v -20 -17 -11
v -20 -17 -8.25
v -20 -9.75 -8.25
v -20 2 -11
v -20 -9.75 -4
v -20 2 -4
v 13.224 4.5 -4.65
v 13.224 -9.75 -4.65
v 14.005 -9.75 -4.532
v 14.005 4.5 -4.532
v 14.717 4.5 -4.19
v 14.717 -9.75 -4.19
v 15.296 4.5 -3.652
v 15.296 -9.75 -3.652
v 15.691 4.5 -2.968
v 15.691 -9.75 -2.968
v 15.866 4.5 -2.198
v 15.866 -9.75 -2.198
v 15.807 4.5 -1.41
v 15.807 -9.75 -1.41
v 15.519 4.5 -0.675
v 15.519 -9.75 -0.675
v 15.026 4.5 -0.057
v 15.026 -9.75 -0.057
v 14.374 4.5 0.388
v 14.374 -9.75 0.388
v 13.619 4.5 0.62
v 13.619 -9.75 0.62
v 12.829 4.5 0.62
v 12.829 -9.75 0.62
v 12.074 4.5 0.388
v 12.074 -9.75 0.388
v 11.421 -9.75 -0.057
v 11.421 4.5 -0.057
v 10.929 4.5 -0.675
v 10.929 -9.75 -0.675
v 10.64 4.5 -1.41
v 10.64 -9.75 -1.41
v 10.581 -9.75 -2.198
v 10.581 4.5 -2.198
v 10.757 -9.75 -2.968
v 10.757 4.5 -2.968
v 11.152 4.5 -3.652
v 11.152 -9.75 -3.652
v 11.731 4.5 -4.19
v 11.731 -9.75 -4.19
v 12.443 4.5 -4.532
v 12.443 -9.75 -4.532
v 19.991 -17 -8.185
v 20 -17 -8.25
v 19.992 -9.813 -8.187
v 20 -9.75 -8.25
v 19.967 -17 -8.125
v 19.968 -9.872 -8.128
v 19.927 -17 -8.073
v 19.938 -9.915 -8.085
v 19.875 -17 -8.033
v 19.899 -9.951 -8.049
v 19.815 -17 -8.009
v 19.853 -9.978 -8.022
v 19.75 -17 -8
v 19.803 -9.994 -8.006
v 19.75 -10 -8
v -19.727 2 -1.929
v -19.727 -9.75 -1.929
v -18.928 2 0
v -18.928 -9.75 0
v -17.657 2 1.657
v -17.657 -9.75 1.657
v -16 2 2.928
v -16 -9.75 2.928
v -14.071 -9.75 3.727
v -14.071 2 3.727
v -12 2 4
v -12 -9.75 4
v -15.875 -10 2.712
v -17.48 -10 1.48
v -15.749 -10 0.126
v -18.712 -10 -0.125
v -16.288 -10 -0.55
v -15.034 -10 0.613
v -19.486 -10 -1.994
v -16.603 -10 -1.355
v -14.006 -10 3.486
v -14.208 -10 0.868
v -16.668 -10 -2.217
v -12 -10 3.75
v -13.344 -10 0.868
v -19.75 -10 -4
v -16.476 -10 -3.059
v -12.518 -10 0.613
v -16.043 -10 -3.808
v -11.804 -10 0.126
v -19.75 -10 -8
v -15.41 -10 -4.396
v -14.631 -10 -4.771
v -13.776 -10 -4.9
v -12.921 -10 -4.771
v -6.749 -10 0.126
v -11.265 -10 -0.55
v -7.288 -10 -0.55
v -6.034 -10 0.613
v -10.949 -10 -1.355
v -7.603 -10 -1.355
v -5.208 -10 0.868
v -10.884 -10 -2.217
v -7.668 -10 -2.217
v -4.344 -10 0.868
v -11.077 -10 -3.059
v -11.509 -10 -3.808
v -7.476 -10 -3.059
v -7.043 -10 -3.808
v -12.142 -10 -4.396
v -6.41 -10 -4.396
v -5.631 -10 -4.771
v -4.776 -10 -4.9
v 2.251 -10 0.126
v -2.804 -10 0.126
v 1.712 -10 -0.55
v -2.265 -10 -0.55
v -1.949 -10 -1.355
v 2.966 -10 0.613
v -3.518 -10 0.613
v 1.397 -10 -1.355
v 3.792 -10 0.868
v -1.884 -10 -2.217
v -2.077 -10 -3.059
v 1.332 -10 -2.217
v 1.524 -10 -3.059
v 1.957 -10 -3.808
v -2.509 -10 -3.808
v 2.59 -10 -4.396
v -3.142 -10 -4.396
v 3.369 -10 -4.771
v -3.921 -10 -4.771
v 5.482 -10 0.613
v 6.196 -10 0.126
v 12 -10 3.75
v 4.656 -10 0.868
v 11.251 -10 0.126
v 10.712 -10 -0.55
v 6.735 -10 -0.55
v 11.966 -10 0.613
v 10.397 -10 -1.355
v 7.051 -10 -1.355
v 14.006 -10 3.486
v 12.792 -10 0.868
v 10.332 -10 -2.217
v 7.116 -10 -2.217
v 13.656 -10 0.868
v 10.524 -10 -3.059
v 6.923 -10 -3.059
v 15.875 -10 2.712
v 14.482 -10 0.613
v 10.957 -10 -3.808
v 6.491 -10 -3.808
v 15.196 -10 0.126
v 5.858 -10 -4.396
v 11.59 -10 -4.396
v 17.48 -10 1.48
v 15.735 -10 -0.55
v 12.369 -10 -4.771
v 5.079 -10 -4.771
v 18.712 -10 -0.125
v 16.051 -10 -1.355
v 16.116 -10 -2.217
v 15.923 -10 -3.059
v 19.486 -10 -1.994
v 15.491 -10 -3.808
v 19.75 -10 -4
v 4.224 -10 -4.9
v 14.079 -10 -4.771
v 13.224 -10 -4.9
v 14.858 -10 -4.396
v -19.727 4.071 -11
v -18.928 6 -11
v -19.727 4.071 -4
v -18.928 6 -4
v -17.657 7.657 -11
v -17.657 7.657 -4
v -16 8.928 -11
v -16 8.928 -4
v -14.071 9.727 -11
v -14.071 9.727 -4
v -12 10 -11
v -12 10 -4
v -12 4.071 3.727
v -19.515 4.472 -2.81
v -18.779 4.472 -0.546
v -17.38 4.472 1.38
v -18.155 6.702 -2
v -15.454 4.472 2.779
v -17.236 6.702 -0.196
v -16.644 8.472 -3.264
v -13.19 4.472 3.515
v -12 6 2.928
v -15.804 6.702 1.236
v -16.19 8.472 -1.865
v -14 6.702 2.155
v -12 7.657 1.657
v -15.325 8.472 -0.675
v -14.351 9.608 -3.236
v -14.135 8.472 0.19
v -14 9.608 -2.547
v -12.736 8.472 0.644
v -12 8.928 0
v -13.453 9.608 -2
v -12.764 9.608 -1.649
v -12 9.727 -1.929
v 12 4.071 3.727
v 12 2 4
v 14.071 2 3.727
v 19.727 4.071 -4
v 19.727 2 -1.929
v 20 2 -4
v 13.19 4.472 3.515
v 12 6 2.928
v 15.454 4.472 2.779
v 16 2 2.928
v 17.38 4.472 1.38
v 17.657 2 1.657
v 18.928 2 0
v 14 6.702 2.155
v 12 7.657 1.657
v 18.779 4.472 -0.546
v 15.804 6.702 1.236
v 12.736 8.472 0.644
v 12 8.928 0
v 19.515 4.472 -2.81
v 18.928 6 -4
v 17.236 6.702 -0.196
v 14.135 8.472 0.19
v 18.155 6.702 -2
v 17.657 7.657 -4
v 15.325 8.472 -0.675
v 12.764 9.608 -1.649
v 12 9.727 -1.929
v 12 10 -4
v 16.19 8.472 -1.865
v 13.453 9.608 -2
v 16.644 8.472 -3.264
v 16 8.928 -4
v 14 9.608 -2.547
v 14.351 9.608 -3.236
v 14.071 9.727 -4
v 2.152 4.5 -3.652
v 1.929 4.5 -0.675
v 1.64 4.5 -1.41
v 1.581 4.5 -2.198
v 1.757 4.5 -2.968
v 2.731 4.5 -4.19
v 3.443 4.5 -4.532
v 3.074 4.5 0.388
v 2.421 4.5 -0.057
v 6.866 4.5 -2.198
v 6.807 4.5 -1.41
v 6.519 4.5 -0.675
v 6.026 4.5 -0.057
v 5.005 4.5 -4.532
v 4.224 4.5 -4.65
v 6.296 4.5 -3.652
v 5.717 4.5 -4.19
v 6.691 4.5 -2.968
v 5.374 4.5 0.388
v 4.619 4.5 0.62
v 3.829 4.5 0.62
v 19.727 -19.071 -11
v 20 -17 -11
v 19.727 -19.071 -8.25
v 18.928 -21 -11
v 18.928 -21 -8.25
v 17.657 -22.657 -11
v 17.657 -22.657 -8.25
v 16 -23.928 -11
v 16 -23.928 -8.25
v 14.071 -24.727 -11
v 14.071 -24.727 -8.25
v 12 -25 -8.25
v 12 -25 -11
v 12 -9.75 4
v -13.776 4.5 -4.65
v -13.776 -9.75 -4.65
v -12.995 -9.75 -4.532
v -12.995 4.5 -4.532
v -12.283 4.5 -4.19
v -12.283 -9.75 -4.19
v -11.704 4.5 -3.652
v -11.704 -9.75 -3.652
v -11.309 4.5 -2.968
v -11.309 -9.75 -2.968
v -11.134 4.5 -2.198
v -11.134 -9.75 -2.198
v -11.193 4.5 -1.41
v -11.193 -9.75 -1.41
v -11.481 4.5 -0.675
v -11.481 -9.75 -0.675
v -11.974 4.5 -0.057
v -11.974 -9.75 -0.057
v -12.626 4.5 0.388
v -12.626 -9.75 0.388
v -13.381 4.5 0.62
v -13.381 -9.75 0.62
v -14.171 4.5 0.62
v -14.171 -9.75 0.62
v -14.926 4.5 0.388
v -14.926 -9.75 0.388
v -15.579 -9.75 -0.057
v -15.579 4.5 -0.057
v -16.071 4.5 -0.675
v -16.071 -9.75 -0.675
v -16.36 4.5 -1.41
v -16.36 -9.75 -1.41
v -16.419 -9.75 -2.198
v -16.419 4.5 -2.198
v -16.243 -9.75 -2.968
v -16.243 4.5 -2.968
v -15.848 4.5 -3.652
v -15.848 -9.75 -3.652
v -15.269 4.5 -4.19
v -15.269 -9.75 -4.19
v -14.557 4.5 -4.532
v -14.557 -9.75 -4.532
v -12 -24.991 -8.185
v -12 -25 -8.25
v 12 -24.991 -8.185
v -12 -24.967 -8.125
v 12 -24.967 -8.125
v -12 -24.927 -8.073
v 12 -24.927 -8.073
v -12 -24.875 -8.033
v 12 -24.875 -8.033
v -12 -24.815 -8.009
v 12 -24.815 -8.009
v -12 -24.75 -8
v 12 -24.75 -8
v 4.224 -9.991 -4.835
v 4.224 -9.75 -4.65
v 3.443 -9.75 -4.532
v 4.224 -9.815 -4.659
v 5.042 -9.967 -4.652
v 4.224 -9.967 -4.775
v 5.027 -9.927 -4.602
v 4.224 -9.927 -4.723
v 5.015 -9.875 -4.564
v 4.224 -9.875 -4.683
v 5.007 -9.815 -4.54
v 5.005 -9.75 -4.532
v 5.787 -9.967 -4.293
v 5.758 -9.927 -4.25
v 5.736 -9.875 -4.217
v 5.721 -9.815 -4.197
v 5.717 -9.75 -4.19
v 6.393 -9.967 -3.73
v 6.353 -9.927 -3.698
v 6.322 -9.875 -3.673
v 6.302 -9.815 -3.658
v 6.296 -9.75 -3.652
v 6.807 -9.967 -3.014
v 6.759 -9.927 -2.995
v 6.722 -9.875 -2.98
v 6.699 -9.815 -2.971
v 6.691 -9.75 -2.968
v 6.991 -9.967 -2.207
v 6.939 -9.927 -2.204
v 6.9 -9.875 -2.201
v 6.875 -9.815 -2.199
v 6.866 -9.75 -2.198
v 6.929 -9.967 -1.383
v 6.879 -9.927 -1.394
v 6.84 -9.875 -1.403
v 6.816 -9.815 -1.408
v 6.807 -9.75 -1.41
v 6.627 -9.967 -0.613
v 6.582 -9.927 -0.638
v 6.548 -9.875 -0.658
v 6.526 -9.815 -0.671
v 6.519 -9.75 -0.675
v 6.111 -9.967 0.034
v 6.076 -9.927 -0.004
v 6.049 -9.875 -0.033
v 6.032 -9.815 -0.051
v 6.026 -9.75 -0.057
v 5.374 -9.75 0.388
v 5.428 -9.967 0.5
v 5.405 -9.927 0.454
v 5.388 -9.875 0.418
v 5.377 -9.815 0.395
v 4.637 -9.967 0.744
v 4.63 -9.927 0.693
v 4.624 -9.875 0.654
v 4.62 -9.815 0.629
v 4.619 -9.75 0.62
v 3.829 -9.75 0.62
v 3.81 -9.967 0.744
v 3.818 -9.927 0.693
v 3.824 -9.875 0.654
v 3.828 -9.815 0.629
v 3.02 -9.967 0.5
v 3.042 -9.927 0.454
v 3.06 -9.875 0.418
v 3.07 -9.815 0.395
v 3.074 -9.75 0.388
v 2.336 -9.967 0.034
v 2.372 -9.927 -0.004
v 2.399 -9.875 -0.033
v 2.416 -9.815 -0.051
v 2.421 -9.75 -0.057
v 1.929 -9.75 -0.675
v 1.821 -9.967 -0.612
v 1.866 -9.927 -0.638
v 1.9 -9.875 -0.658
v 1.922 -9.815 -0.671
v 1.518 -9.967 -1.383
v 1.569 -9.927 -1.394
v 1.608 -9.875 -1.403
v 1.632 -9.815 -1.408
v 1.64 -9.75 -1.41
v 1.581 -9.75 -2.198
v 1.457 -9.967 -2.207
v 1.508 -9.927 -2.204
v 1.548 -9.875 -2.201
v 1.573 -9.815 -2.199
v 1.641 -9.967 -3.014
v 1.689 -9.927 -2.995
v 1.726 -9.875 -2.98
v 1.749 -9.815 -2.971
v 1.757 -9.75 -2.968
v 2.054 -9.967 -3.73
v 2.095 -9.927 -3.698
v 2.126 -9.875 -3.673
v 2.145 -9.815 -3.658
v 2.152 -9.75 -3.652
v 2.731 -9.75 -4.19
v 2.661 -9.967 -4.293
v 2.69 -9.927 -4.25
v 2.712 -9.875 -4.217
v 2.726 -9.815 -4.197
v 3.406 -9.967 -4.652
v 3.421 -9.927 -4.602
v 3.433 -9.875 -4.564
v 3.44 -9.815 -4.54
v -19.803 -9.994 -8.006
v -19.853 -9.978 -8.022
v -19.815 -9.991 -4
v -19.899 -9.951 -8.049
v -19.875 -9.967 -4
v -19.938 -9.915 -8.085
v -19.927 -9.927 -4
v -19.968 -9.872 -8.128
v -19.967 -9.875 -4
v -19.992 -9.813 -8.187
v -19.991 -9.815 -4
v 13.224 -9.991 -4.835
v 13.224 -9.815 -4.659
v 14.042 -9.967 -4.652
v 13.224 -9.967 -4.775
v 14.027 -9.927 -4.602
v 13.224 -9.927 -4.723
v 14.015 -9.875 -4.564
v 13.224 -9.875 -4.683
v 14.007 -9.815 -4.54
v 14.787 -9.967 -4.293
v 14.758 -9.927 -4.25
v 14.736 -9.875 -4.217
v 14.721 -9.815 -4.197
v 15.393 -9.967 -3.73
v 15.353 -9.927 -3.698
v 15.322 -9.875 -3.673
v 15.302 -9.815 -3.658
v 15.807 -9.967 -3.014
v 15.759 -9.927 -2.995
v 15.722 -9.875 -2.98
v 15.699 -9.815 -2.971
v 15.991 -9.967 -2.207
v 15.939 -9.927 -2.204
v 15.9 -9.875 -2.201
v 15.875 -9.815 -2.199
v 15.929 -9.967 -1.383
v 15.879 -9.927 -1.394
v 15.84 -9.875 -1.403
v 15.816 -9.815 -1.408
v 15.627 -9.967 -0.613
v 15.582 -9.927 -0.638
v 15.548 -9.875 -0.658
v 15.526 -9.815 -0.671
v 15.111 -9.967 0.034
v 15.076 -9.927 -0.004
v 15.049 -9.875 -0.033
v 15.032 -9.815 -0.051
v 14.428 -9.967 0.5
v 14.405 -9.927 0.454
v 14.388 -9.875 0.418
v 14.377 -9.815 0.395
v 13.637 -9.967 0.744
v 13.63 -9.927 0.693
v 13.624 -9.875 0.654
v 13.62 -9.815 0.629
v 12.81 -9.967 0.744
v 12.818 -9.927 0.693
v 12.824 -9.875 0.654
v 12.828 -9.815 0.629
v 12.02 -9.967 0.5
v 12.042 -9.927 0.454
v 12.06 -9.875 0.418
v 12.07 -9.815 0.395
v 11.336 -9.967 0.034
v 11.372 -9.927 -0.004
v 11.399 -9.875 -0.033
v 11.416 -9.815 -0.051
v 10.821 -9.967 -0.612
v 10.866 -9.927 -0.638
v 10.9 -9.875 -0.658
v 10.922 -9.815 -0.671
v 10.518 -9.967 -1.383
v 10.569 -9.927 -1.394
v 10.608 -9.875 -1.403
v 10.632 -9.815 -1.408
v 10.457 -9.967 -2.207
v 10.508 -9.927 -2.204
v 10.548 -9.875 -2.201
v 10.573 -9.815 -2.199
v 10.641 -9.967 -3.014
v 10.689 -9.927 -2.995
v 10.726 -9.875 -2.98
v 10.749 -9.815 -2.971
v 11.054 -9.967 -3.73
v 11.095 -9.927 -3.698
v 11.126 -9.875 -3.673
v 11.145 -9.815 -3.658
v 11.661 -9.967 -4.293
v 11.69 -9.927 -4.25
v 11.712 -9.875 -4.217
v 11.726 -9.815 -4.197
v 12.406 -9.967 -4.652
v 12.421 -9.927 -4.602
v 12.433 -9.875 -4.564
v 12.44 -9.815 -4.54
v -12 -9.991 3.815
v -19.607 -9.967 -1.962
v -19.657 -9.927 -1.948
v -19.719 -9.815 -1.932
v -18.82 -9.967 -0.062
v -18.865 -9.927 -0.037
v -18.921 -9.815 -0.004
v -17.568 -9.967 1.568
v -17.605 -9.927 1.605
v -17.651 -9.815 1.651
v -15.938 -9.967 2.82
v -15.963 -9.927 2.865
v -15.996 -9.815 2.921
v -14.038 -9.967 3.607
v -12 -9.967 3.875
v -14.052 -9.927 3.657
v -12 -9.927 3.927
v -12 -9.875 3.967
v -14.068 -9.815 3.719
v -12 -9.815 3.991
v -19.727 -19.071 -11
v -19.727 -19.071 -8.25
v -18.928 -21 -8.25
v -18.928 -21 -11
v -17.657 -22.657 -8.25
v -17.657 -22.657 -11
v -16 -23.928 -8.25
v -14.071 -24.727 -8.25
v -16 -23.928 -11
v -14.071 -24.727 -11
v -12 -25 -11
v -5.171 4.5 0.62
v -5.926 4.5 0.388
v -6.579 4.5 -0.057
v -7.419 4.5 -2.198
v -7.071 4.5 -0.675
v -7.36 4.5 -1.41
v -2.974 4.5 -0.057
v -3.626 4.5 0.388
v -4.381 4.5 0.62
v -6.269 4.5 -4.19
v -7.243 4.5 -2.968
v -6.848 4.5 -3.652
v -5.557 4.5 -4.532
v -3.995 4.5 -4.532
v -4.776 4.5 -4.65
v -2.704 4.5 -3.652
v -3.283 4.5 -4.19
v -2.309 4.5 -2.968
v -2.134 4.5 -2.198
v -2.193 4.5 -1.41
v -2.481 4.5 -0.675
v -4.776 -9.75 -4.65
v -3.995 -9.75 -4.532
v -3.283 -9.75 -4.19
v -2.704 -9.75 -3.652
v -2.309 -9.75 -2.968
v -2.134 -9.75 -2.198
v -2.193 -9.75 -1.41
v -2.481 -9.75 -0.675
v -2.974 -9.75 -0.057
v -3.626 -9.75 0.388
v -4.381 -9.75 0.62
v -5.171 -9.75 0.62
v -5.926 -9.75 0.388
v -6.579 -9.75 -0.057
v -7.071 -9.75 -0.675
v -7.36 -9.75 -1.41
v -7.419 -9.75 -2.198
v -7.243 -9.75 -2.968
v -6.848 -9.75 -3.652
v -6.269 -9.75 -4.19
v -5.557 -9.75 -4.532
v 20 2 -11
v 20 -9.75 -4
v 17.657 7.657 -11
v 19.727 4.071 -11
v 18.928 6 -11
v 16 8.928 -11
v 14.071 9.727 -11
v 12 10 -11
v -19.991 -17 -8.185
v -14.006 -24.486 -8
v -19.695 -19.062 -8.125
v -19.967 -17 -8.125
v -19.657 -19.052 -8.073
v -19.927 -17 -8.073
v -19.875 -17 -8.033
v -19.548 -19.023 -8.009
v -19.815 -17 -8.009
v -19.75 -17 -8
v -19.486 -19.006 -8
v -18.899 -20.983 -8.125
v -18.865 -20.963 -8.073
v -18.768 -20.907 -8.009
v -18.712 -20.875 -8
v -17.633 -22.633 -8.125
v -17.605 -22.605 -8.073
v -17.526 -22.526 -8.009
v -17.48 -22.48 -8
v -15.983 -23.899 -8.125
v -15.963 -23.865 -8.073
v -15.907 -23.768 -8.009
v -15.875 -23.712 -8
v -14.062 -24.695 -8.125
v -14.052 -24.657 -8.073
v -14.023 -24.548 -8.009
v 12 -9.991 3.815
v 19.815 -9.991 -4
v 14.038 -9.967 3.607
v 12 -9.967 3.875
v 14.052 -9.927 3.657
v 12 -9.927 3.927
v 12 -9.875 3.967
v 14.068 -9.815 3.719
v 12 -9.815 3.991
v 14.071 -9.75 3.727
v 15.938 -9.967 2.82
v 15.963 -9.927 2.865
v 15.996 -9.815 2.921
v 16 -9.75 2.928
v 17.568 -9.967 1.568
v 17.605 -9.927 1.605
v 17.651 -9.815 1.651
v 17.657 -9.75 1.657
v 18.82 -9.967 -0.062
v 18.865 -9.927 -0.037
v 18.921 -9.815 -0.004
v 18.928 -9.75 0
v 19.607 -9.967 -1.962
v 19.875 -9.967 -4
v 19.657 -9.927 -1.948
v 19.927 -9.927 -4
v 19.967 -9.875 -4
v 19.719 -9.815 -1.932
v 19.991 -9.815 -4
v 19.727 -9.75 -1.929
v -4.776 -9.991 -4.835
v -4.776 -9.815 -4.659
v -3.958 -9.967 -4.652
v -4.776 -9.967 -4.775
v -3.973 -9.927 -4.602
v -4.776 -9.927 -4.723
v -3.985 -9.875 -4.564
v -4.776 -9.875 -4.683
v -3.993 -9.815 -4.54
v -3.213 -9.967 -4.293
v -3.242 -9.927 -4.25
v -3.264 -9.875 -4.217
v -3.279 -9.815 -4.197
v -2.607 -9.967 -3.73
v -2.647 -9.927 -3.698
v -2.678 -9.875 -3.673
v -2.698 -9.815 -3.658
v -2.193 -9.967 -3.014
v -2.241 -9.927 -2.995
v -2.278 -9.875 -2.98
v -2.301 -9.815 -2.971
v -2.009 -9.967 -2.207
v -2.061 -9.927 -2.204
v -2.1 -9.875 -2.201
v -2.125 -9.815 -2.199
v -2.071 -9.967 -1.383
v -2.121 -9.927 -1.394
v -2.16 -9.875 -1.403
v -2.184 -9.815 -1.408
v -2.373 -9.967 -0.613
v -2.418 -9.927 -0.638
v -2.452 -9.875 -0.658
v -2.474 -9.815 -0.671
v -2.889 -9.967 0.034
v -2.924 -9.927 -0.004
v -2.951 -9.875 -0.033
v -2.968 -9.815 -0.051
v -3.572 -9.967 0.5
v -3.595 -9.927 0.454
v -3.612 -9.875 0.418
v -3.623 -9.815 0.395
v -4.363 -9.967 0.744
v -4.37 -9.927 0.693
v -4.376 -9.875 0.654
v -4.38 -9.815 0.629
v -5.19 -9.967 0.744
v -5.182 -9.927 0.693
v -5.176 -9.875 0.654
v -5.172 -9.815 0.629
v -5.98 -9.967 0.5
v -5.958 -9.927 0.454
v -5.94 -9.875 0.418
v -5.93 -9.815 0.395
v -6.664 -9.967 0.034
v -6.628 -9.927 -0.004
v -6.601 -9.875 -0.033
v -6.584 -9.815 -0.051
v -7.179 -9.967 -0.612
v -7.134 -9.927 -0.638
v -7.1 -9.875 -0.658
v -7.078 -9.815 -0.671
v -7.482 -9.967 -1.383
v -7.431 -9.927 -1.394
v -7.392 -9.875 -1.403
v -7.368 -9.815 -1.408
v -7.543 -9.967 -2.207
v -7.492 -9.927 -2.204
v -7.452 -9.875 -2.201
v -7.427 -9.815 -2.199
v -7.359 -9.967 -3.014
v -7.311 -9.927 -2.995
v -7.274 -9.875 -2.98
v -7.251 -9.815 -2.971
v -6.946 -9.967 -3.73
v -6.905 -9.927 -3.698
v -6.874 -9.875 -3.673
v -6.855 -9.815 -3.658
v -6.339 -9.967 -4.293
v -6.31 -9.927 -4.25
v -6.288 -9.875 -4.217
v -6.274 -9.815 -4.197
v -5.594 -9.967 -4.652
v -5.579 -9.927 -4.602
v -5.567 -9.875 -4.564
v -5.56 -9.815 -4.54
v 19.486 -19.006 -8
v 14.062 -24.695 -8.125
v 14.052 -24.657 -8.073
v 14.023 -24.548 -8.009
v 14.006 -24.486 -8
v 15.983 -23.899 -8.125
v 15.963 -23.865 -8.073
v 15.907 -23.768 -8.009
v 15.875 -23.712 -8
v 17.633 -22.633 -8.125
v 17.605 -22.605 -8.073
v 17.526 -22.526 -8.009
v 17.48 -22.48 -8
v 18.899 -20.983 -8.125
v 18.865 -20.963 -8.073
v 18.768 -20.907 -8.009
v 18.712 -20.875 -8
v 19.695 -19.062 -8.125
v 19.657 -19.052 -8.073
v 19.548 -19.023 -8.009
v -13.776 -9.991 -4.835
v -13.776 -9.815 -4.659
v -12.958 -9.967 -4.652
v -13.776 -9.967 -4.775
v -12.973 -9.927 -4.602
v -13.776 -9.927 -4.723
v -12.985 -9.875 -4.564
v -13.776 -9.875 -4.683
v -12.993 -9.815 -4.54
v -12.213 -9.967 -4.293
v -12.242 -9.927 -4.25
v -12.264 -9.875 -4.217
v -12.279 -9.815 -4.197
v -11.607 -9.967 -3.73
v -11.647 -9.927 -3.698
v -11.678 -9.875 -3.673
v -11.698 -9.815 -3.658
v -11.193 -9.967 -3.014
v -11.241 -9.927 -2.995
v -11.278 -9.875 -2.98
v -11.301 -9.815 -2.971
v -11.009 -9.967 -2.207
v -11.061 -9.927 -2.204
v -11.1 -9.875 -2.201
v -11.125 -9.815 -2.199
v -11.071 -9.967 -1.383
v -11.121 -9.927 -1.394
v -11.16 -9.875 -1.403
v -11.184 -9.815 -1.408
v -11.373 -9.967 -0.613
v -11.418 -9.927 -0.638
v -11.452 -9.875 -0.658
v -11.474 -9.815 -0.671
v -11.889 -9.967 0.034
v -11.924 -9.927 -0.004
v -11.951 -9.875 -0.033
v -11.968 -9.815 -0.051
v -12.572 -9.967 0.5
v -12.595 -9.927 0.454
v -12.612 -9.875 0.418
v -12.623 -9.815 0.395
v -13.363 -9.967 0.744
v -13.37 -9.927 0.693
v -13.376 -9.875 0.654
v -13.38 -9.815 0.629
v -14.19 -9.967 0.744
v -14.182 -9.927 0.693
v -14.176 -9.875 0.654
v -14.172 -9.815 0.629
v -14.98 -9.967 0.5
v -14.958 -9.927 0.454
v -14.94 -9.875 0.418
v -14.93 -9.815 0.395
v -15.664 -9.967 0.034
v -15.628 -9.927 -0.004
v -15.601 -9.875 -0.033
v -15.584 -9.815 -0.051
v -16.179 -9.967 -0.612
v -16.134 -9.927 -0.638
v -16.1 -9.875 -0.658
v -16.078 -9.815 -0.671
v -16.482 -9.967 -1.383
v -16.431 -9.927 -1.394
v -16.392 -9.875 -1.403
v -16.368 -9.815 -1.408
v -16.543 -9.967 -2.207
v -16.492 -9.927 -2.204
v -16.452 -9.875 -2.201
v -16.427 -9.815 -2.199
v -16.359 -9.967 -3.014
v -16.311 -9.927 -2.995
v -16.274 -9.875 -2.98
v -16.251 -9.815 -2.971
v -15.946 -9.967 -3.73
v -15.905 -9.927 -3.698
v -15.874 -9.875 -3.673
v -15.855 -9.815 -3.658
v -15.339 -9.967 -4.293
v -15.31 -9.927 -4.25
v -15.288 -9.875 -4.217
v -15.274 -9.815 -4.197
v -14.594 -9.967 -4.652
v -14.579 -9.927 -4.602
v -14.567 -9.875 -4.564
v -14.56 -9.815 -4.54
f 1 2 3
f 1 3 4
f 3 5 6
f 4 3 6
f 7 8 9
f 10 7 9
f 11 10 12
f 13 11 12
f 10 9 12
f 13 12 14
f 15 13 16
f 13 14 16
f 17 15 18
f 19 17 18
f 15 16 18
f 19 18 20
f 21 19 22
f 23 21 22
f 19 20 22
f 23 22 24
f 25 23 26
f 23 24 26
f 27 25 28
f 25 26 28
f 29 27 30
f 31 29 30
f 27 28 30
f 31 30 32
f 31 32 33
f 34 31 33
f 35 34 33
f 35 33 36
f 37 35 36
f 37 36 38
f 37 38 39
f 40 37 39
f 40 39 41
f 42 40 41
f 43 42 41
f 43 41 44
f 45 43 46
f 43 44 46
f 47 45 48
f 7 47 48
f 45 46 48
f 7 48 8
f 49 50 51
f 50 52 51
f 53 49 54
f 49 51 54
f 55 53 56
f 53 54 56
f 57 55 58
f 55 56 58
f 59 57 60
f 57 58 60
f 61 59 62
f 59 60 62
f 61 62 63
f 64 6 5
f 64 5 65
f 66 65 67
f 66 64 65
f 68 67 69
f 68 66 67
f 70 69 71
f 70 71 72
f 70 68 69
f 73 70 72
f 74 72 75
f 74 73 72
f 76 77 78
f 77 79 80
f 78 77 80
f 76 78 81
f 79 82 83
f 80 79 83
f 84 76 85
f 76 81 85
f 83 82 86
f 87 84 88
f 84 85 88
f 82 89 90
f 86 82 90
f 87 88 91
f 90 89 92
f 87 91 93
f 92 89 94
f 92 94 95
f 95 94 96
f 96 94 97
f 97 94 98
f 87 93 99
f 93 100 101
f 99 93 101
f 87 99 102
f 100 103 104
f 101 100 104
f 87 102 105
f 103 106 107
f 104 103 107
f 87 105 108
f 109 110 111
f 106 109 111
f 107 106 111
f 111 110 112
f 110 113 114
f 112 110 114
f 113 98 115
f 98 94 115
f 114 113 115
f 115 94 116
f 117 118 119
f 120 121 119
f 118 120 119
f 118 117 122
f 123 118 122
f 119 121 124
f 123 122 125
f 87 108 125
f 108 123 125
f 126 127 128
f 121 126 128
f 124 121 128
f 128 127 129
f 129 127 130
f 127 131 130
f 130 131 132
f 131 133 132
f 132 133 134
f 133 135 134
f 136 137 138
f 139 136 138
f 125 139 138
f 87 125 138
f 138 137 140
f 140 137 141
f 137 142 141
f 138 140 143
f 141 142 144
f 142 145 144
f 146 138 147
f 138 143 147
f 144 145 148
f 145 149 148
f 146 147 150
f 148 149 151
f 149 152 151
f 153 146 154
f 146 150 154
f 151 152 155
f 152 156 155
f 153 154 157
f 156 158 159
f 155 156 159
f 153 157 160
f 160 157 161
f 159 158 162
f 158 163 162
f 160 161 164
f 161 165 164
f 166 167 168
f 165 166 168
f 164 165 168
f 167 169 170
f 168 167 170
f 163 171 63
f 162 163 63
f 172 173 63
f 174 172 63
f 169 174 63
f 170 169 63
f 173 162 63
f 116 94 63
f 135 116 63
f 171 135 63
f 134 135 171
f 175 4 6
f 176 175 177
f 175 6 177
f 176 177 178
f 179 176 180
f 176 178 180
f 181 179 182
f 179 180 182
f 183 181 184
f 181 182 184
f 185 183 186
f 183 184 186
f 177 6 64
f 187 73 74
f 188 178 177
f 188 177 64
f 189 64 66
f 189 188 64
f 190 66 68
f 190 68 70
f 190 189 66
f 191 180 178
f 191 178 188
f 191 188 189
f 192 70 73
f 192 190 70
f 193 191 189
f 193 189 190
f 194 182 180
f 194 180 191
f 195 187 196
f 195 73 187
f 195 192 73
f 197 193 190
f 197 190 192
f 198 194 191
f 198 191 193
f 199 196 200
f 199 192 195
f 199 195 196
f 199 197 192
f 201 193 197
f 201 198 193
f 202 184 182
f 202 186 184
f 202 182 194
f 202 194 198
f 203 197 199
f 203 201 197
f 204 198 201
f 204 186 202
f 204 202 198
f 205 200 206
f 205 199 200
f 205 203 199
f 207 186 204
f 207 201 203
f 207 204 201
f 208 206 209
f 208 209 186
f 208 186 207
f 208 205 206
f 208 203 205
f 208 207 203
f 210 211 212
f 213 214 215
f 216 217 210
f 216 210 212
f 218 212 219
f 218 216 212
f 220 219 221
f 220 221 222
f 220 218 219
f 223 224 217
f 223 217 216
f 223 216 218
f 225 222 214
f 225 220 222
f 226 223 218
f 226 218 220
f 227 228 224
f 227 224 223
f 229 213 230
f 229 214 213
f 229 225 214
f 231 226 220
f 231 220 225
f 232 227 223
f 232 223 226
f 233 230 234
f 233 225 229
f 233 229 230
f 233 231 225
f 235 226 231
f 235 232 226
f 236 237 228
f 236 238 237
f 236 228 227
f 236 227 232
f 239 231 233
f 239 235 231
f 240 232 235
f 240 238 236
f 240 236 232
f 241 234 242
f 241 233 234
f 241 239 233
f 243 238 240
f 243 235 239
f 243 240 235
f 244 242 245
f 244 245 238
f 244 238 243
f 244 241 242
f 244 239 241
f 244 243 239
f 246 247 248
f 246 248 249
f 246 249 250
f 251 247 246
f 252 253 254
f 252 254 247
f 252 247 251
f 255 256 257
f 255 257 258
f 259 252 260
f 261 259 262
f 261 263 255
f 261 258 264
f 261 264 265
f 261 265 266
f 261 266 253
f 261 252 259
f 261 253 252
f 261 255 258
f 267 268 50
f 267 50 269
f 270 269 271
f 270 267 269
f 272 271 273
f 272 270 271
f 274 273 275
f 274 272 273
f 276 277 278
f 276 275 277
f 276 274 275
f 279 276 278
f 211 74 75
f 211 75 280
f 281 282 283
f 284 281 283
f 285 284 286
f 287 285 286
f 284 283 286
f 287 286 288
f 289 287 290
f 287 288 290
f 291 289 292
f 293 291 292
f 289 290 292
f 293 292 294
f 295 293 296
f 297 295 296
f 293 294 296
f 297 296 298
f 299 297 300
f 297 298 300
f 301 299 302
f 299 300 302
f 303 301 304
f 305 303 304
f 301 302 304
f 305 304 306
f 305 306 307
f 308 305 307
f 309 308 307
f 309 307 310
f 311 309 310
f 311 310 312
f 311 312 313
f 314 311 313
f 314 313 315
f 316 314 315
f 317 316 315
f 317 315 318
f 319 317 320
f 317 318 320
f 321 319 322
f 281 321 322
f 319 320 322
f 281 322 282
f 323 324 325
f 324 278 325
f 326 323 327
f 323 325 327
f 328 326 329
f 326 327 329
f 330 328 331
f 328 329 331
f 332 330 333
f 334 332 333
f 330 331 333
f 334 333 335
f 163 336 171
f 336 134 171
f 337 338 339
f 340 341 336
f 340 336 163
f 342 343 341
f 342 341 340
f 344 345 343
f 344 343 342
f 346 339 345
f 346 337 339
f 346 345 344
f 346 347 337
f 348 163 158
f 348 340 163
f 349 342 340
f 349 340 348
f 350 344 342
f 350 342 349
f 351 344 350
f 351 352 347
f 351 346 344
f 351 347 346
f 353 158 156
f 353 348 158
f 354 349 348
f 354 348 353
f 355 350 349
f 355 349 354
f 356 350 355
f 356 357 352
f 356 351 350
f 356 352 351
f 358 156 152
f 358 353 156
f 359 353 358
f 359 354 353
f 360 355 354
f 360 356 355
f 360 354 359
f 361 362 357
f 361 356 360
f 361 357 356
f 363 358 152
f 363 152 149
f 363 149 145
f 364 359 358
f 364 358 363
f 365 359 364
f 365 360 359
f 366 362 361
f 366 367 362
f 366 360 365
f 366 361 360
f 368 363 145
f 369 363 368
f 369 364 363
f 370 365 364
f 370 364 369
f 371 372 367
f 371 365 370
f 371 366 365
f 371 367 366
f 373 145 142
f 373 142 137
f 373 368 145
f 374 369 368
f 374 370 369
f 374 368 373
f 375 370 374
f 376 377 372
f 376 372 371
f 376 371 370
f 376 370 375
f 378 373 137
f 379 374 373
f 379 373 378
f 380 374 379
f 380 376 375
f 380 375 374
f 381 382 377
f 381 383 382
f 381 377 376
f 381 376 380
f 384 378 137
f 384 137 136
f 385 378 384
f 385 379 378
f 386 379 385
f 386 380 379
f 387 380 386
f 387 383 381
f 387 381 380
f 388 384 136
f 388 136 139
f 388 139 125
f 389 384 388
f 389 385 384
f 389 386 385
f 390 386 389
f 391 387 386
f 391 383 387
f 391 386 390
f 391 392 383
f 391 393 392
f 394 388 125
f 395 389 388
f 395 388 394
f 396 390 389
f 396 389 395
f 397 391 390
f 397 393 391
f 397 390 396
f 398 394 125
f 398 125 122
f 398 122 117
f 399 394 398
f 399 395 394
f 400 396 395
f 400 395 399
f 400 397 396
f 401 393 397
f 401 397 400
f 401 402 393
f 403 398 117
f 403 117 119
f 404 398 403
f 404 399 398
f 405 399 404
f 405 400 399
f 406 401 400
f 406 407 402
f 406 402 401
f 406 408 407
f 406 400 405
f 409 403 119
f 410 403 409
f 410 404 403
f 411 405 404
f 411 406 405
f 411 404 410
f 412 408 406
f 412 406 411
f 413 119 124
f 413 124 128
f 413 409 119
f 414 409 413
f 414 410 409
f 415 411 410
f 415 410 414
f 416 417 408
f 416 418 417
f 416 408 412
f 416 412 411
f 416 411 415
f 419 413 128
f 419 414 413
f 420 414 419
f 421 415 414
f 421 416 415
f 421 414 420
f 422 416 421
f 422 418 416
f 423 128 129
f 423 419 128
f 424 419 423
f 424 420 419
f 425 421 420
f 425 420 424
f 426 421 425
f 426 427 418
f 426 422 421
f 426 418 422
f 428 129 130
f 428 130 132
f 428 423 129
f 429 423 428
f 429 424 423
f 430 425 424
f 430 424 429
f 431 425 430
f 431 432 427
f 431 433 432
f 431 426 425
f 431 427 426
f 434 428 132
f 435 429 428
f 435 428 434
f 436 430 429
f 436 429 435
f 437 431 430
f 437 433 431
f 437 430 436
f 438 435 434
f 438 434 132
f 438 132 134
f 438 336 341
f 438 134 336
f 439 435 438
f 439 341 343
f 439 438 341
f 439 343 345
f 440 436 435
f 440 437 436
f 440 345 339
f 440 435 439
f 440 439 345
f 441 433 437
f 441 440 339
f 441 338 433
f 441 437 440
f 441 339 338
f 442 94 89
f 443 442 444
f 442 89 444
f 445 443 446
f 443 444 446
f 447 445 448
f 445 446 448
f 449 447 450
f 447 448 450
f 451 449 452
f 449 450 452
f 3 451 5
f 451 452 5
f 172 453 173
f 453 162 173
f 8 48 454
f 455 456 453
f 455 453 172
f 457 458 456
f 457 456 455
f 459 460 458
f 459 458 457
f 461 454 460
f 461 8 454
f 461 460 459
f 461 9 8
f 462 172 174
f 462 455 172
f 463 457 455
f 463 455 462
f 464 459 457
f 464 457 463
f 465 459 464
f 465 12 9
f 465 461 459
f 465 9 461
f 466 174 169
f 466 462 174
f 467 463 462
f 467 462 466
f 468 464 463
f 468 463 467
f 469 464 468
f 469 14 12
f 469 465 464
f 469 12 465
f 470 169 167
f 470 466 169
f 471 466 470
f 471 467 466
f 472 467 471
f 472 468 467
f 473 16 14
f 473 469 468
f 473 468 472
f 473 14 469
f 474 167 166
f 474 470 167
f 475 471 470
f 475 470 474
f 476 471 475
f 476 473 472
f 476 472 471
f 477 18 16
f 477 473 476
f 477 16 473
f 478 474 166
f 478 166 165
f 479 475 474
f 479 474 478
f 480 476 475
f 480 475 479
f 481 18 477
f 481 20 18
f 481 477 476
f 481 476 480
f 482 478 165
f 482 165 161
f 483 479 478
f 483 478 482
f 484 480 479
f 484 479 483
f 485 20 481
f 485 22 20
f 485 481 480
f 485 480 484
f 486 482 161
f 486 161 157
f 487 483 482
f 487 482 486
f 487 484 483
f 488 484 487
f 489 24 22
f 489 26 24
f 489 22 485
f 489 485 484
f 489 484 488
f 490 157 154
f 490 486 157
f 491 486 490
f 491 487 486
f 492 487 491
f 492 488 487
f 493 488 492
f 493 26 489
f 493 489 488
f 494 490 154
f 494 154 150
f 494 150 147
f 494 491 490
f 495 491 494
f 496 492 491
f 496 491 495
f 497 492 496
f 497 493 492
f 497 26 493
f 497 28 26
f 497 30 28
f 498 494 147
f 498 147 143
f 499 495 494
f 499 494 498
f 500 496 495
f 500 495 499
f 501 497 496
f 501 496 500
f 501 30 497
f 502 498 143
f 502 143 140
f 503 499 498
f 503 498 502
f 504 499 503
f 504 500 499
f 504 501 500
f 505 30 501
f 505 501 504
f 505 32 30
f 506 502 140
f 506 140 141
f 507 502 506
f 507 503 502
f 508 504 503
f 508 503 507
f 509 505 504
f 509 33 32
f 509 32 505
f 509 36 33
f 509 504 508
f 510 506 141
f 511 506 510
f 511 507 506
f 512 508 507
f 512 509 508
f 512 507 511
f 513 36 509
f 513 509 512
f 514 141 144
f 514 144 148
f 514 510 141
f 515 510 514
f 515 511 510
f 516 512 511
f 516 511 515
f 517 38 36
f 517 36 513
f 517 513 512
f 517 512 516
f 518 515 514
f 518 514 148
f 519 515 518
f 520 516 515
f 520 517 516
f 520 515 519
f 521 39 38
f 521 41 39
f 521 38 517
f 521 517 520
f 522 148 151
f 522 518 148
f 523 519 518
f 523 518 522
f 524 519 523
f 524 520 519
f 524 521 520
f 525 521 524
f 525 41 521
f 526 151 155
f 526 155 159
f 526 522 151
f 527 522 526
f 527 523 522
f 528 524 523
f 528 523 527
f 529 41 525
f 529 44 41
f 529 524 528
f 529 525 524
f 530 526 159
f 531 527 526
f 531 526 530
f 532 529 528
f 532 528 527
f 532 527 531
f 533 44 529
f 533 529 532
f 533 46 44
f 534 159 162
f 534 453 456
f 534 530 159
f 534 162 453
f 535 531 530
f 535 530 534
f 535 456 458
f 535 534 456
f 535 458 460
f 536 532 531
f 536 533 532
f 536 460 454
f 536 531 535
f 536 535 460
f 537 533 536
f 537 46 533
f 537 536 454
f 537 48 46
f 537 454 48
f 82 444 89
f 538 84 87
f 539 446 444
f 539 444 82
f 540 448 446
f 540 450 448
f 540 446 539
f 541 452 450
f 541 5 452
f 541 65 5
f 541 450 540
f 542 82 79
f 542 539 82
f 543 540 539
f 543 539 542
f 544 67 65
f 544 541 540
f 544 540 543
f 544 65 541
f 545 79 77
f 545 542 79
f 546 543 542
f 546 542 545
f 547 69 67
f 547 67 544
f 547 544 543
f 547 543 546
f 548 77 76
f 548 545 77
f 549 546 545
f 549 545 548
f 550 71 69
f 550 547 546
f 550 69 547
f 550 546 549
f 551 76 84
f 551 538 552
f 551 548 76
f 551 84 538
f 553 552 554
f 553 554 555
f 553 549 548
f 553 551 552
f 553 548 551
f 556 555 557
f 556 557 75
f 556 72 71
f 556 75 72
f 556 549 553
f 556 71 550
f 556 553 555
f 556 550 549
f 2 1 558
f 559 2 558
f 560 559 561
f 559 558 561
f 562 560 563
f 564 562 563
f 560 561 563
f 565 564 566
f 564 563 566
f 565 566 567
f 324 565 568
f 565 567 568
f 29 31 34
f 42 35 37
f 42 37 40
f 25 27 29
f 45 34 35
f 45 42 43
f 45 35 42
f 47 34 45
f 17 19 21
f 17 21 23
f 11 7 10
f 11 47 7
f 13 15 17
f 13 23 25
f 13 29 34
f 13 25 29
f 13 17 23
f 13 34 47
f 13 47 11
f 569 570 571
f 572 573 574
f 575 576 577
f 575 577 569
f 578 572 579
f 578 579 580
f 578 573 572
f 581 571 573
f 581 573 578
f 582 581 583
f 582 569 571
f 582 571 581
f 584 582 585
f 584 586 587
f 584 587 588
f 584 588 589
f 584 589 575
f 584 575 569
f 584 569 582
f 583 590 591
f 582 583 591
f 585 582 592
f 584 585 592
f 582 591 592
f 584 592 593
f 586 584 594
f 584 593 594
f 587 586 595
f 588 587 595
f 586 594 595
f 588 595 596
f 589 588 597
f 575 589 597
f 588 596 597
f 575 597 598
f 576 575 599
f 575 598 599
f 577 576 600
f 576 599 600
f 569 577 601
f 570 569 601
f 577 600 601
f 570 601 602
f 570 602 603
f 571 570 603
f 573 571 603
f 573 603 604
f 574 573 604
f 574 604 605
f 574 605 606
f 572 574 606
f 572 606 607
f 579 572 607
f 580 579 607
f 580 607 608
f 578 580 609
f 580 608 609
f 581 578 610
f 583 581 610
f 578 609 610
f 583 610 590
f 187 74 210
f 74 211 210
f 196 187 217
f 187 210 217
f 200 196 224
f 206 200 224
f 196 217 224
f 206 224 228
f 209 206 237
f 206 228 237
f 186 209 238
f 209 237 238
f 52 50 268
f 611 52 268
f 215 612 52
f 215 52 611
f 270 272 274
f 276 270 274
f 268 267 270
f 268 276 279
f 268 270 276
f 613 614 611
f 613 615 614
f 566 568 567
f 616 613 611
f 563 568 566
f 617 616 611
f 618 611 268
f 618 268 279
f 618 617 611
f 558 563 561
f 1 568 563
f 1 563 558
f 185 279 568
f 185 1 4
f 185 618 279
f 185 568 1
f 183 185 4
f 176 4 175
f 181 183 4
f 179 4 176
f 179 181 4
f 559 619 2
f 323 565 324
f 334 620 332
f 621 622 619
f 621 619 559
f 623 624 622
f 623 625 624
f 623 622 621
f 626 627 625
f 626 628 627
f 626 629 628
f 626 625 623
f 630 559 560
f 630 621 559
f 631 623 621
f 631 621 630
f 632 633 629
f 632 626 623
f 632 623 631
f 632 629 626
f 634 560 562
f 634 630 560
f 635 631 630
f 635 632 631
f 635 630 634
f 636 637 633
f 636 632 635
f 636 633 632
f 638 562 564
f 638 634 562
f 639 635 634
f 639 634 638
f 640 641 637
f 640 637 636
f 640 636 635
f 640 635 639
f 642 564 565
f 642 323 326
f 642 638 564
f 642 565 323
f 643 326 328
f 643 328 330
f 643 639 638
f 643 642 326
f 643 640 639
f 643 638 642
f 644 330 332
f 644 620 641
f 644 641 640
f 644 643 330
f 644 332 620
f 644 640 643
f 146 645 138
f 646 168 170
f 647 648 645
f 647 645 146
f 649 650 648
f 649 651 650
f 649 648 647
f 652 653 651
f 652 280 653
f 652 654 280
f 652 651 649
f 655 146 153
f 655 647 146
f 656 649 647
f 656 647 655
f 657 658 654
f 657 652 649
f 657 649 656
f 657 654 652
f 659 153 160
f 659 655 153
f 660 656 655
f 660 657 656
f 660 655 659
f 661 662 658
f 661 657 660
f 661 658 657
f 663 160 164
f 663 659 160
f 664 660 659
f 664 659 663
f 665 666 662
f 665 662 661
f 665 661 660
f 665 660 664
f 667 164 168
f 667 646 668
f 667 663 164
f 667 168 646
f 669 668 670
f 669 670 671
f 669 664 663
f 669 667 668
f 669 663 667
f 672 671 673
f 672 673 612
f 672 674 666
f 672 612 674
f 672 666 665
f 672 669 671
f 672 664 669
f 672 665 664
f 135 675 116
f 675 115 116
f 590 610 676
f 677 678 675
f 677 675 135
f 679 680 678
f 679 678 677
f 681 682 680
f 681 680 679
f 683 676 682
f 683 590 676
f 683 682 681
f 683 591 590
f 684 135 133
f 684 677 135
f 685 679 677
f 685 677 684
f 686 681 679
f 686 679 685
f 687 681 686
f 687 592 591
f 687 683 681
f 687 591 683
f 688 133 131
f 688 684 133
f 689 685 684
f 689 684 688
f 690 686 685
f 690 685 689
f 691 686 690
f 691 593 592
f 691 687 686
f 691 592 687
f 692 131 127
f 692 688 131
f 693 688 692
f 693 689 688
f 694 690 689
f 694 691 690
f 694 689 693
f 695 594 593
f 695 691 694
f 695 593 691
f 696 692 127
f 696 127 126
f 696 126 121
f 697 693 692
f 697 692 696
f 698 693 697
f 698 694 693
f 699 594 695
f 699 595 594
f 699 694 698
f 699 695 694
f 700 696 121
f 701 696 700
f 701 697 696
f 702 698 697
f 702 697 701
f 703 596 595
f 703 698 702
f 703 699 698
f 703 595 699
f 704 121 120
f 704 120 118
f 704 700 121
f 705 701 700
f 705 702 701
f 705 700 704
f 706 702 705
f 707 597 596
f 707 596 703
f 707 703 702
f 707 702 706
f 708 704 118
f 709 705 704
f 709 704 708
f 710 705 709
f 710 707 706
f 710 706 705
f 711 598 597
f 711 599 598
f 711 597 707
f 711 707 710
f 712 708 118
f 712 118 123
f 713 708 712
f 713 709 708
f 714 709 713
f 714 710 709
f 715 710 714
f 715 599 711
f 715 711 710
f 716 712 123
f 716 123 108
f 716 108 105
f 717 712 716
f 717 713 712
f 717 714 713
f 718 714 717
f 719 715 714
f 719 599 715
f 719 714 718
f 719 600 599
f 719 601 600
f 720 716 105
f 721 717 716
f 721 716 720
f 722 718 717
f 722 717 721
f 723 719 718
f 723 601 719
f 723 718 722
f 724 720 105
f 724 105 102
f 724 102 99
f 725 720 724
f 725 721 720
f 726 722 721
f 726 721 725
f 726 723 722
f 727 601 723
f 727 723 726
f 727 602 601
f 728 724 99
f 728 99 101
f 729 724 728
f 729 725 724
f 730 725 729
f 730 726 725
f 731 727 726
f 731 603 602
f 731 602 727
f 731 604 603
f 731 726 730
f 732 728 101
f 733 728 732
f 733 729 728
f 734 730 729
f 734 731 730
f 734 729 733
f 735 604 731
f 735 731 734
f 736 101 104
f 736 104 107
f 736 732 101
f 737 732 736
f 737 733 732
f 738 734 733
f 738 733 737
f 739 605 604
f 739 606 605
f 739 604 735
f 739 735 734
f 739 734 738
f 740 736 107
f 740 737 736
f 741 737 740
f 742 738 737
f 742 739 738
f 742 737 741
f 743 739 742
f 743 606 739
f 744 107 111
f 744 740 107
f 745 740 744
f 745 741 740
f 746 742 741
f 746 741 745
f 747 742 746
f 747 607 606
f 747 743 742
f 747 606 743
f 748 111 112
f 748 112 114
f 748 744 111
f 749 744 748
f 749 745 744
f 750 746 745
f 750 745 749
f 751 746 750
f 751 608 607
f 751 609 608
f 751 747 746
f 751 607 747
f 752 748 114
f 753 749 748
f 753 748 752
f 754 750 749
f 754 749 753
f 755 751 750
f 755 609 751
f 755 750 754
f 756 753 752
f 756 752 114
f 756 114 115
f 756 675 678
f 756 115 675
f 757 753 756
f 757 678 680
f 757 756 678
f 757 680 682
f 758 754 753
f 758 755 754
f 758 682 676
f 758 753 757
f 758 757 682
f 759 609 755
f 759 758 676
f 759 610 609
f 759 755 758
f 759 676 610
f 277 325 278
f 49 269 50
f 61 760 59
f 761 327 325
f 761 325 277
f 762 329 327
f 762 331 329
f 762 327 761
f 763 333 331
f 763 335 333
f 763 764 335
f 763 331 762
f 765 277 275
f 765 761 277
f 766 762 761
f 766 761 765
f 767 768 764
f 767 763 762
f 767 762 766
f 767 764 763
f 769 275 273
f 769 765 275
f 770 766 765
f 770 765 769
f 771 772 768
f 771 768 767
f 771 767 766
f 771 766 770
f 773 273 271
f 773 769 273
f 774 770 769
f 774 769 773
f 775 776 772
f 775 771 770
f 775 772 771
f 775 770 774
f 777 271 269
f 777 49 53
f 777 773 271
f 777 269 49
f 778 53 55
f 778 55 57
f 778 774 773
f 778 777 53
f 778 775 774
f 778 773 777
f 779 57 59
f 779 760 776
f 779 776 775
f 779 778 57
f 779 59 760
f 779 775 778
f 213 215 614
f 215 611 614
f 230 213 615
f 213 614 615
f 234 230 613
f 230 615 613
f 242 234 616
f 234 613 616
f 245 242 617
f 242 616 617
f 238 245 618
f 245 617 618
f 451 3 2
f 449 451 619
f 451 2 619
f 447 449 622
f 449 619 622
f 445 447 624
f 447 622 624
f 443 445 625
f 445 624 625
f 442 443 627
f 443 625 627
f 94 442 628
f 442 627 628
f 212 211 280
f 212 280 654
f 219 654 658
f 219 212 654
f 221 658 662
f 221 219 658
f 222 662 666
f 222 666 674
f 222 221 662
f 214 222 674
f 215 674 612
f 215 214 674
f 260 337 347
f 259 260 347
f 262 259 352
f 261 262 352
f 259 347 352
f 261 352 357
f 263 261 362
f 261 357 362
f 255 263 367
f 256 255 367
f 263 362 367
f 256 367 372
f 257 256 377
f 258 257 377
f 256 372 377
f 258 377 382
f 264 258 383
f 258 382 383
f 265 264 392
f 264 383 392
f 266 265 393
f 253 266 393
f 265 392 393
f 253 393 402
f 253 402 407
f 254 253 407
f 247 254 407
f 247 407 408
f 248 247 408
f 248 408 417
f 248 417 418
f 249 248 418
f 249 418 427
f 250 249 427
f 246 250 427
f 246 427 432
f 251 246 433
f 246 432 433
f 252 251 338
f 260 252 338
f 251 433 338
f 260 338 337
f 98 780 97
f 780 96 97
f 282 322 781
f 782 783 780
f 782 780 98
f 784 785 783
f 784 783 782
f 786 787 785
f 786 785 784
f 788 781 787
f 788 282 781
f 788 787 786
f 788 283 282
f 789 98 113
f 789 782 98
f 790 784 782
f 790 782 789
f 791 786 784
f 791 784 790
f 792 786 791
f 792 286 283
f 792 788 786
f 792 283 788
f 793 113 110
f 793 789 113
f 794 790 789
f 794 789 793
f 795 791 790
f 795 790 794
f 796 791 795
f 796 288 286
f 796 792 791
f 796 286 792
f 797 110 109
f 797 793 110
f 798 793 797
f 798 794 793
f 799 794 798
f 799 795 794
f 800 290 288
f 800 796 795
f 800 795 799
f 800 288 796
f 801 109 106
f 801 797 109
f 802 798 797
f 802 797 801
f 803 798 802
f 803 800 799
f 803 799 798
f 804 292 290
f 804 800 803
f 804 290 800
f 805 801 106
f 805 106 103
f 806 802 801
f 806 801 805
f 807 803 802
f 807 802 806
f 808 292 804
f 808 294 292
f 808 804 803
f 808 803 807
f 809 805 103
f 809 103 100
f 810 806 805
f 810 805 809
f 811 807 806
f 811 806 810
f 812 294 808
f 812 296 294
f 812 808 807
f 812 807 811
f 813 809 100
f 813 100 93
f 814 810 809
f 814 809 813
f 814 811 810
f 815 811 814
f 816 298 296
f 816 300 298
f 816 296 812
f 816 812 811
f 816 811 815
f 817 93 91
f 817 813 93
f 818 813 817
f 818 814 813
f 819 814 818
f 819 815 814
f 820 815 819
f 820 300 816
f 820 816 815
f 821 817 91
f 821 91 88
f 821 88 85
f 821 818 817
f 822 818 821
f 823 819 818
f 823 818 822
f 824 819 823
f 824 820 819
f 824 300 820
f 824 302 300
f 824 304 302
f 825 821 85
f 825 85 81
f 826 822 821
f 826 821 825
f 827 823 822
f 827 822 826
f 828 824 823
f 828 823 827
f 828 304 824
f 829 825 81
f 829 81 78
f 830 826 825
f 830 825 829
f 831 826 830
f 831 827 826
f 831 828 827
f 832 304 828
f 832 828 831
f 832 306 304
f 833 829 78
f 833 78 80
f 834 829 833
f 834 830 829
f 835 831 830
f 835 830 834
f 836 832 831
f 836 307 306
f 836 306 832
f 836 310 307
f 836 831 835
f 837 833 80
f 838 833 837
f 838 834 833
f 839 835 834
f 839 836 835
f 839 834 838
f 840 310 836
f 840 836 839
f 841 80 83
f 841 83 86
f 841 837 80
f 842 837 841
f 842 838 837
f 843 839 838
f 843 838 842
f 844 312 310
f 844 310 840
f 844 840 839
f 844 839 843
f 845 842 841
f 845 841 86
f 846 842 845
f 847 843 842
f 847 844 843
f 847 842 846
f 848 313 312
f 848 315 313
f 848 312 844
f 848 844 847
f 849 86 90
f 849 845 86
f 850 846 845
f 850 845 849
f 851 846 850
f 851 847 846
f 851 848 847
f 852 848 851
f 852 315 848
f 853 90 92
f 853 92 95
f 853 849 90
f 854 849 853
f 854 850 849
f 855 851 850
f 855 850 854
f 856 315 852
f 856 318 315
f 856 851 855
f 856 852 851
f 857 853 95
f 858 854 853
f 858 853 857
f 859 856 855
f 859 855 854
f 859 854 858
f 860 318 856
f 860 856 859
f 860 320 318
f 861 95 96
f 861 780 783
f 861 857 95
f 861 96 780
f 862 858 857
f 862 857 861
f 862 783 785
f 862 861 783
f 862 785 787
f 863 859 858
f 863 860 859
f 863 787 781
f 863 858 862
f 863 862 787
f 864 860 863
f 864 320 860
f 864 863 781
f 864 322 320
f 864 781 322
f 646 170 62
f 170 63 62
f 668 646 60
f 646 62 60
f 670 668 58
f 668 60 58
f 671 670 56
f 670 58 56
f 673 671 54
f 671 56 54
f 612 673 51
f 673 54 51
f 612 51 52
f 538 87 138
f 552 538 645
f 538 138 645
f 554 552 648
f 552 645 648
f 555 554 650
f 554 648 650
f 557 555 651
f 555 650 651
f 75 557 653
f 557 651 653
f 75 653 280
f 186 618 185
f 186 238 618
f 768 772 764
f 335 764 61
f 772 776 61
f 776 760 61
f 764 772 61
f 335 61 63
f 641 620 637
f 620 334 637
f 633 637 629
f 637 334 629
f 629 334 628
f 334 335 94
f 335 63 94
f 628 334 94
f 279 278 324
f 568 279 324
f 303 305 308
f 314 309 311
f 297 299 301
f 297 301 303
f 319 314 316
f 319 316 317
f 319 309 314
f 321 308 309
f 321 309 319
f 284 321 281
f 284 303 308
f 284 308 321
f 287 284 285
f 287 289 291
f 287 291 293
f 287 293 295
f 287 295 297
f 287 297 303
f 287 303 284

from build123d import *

# Parameters (mm, degrees)
BOSS_EXTRU_1_DEPTH      = 4
BOSS_EXTRU_1_DEPTH_BACK = 8
ESQUISSE1_W             = 40
ESQUISSE1_H             = 20
ESQUISSE2_R             = 2.65
ENL_V_MAT_EXTRU_1_DEPTH = 14.5
CONG_1_R                = 8
CONG_2_R                = 0.25
ESQUISSE3_W             = 40
ESQUISSE3_H             = 35
BOSS_EXTRU_2_DEPTH      = 3
CONG_3_R                = 8
CONG_4_R                = 0.25


with BuildPart() as part:
    # Esquisse1 → Boss.-Extru.1 (new, two sides: drawn at the far end of the back side and taken through both)
    with BuildSketch(Plane.XY.offset(-BOSS_EXTRU_1_DEPTH_BACK)):
        Rectangle(ESQUISSE1_W, ESQUISSE1_H)
    extrude(amount=BOSS_EXTRU_1_DEPTH + BOSS_EXTRU_1_DEPTH_BACK)

    # Esquisse2 → Enlèv. mat.-Extru.1 (cut)
    with BuildSketch(Plane.XZ.offset(10)):
        with Locations(Location((-13.776114995, -2, 0), (0, 0, 270))):
            Circle(ESQUISSE2_R)
        with Locations(Location((-4.776114995, -2, 0), (0, 0, 270))):
            Circle(ESQUISSE2_R)
        with Locations(Location((4.223885005, -2, 0), (0, 0, 270))):
            Circle(ESQUISSE2_R)
        with Locations(Location((13.223885005, -2, 0), (0, 0, 270))):
            Circle(ESQUISSE2_R)
    extrude(amount=-ENL_V_MAT_EXTRU_1_DEPTH, mode=Mode.SUBTRACT)

    # Congé1
    cong_1_edges = [part.edges().sort_by_distance(p)[0] for p in [
        (20, 0, 4),
        (-20, 0, 4),
    ]]
    fillet(cong_1_edges, radius=CONG_1_R)

    # Congé2
    cong_2_edges = [part.edges().sort_by_distance(p)[0] for p in [
        (-13.776114995, -10, 0.65),
        (-4.776114995, -10, 0.65),
        (4.223885005, -10, 0.65),
        (13.223885005, -10, 0.65),
    ]]
    fillet(cong_2_edges, radius=CONG_2_R)

    # Esquisse3 → Boss.-Extru.2 (add)
    with BuildSketch(Plane(origin=(0, 0, -8), x_dir=(-1, 0, 0), z_dir=(0, 0, -1))):
        with Locations((0, -7.5)):
            Rectangle(ESQUISSE3_W, ESQUISSE3_H)
    extrude(amount=BOSS_EXTRU_2_DEPTH)

    # Congé3
    cong_3_edges = [part.edges().sort_by_distance(p)[0] for p in [
        (0, 10, 4),
        (17.656854249, 10, 1.656854249),
        (-17.656854249, 10, 1.656854249),
        (-20, -25, -9.5),
        (20, -25, -9.5),
        (-20, 10, -7.5),
        (20, 10, -7.5),
    ]]
    fillet(cong_3_edges, radius=CONG_3_R)

    # Congé4
    cong_4_edges = [part.edges().sort_by_distance(p)[0] for p in [
        (0, -10, 4),
        (17.656854249, -10, 1.656854249),
        (-17.656854249, -10, 1.656854249),
        (20, -13.5, -8),
        (20, -10, -6),
        (-20, -10, -6),
        (-20, -13.5, -8),
        (0, -25, -8),
        (17.656854249, -22.656854249, -8),
        (-17.656854249, -22.656854249, -8),
    ]]
    fillet(cong_4_edges, radius=CONG_4_R)


solid = part.part
